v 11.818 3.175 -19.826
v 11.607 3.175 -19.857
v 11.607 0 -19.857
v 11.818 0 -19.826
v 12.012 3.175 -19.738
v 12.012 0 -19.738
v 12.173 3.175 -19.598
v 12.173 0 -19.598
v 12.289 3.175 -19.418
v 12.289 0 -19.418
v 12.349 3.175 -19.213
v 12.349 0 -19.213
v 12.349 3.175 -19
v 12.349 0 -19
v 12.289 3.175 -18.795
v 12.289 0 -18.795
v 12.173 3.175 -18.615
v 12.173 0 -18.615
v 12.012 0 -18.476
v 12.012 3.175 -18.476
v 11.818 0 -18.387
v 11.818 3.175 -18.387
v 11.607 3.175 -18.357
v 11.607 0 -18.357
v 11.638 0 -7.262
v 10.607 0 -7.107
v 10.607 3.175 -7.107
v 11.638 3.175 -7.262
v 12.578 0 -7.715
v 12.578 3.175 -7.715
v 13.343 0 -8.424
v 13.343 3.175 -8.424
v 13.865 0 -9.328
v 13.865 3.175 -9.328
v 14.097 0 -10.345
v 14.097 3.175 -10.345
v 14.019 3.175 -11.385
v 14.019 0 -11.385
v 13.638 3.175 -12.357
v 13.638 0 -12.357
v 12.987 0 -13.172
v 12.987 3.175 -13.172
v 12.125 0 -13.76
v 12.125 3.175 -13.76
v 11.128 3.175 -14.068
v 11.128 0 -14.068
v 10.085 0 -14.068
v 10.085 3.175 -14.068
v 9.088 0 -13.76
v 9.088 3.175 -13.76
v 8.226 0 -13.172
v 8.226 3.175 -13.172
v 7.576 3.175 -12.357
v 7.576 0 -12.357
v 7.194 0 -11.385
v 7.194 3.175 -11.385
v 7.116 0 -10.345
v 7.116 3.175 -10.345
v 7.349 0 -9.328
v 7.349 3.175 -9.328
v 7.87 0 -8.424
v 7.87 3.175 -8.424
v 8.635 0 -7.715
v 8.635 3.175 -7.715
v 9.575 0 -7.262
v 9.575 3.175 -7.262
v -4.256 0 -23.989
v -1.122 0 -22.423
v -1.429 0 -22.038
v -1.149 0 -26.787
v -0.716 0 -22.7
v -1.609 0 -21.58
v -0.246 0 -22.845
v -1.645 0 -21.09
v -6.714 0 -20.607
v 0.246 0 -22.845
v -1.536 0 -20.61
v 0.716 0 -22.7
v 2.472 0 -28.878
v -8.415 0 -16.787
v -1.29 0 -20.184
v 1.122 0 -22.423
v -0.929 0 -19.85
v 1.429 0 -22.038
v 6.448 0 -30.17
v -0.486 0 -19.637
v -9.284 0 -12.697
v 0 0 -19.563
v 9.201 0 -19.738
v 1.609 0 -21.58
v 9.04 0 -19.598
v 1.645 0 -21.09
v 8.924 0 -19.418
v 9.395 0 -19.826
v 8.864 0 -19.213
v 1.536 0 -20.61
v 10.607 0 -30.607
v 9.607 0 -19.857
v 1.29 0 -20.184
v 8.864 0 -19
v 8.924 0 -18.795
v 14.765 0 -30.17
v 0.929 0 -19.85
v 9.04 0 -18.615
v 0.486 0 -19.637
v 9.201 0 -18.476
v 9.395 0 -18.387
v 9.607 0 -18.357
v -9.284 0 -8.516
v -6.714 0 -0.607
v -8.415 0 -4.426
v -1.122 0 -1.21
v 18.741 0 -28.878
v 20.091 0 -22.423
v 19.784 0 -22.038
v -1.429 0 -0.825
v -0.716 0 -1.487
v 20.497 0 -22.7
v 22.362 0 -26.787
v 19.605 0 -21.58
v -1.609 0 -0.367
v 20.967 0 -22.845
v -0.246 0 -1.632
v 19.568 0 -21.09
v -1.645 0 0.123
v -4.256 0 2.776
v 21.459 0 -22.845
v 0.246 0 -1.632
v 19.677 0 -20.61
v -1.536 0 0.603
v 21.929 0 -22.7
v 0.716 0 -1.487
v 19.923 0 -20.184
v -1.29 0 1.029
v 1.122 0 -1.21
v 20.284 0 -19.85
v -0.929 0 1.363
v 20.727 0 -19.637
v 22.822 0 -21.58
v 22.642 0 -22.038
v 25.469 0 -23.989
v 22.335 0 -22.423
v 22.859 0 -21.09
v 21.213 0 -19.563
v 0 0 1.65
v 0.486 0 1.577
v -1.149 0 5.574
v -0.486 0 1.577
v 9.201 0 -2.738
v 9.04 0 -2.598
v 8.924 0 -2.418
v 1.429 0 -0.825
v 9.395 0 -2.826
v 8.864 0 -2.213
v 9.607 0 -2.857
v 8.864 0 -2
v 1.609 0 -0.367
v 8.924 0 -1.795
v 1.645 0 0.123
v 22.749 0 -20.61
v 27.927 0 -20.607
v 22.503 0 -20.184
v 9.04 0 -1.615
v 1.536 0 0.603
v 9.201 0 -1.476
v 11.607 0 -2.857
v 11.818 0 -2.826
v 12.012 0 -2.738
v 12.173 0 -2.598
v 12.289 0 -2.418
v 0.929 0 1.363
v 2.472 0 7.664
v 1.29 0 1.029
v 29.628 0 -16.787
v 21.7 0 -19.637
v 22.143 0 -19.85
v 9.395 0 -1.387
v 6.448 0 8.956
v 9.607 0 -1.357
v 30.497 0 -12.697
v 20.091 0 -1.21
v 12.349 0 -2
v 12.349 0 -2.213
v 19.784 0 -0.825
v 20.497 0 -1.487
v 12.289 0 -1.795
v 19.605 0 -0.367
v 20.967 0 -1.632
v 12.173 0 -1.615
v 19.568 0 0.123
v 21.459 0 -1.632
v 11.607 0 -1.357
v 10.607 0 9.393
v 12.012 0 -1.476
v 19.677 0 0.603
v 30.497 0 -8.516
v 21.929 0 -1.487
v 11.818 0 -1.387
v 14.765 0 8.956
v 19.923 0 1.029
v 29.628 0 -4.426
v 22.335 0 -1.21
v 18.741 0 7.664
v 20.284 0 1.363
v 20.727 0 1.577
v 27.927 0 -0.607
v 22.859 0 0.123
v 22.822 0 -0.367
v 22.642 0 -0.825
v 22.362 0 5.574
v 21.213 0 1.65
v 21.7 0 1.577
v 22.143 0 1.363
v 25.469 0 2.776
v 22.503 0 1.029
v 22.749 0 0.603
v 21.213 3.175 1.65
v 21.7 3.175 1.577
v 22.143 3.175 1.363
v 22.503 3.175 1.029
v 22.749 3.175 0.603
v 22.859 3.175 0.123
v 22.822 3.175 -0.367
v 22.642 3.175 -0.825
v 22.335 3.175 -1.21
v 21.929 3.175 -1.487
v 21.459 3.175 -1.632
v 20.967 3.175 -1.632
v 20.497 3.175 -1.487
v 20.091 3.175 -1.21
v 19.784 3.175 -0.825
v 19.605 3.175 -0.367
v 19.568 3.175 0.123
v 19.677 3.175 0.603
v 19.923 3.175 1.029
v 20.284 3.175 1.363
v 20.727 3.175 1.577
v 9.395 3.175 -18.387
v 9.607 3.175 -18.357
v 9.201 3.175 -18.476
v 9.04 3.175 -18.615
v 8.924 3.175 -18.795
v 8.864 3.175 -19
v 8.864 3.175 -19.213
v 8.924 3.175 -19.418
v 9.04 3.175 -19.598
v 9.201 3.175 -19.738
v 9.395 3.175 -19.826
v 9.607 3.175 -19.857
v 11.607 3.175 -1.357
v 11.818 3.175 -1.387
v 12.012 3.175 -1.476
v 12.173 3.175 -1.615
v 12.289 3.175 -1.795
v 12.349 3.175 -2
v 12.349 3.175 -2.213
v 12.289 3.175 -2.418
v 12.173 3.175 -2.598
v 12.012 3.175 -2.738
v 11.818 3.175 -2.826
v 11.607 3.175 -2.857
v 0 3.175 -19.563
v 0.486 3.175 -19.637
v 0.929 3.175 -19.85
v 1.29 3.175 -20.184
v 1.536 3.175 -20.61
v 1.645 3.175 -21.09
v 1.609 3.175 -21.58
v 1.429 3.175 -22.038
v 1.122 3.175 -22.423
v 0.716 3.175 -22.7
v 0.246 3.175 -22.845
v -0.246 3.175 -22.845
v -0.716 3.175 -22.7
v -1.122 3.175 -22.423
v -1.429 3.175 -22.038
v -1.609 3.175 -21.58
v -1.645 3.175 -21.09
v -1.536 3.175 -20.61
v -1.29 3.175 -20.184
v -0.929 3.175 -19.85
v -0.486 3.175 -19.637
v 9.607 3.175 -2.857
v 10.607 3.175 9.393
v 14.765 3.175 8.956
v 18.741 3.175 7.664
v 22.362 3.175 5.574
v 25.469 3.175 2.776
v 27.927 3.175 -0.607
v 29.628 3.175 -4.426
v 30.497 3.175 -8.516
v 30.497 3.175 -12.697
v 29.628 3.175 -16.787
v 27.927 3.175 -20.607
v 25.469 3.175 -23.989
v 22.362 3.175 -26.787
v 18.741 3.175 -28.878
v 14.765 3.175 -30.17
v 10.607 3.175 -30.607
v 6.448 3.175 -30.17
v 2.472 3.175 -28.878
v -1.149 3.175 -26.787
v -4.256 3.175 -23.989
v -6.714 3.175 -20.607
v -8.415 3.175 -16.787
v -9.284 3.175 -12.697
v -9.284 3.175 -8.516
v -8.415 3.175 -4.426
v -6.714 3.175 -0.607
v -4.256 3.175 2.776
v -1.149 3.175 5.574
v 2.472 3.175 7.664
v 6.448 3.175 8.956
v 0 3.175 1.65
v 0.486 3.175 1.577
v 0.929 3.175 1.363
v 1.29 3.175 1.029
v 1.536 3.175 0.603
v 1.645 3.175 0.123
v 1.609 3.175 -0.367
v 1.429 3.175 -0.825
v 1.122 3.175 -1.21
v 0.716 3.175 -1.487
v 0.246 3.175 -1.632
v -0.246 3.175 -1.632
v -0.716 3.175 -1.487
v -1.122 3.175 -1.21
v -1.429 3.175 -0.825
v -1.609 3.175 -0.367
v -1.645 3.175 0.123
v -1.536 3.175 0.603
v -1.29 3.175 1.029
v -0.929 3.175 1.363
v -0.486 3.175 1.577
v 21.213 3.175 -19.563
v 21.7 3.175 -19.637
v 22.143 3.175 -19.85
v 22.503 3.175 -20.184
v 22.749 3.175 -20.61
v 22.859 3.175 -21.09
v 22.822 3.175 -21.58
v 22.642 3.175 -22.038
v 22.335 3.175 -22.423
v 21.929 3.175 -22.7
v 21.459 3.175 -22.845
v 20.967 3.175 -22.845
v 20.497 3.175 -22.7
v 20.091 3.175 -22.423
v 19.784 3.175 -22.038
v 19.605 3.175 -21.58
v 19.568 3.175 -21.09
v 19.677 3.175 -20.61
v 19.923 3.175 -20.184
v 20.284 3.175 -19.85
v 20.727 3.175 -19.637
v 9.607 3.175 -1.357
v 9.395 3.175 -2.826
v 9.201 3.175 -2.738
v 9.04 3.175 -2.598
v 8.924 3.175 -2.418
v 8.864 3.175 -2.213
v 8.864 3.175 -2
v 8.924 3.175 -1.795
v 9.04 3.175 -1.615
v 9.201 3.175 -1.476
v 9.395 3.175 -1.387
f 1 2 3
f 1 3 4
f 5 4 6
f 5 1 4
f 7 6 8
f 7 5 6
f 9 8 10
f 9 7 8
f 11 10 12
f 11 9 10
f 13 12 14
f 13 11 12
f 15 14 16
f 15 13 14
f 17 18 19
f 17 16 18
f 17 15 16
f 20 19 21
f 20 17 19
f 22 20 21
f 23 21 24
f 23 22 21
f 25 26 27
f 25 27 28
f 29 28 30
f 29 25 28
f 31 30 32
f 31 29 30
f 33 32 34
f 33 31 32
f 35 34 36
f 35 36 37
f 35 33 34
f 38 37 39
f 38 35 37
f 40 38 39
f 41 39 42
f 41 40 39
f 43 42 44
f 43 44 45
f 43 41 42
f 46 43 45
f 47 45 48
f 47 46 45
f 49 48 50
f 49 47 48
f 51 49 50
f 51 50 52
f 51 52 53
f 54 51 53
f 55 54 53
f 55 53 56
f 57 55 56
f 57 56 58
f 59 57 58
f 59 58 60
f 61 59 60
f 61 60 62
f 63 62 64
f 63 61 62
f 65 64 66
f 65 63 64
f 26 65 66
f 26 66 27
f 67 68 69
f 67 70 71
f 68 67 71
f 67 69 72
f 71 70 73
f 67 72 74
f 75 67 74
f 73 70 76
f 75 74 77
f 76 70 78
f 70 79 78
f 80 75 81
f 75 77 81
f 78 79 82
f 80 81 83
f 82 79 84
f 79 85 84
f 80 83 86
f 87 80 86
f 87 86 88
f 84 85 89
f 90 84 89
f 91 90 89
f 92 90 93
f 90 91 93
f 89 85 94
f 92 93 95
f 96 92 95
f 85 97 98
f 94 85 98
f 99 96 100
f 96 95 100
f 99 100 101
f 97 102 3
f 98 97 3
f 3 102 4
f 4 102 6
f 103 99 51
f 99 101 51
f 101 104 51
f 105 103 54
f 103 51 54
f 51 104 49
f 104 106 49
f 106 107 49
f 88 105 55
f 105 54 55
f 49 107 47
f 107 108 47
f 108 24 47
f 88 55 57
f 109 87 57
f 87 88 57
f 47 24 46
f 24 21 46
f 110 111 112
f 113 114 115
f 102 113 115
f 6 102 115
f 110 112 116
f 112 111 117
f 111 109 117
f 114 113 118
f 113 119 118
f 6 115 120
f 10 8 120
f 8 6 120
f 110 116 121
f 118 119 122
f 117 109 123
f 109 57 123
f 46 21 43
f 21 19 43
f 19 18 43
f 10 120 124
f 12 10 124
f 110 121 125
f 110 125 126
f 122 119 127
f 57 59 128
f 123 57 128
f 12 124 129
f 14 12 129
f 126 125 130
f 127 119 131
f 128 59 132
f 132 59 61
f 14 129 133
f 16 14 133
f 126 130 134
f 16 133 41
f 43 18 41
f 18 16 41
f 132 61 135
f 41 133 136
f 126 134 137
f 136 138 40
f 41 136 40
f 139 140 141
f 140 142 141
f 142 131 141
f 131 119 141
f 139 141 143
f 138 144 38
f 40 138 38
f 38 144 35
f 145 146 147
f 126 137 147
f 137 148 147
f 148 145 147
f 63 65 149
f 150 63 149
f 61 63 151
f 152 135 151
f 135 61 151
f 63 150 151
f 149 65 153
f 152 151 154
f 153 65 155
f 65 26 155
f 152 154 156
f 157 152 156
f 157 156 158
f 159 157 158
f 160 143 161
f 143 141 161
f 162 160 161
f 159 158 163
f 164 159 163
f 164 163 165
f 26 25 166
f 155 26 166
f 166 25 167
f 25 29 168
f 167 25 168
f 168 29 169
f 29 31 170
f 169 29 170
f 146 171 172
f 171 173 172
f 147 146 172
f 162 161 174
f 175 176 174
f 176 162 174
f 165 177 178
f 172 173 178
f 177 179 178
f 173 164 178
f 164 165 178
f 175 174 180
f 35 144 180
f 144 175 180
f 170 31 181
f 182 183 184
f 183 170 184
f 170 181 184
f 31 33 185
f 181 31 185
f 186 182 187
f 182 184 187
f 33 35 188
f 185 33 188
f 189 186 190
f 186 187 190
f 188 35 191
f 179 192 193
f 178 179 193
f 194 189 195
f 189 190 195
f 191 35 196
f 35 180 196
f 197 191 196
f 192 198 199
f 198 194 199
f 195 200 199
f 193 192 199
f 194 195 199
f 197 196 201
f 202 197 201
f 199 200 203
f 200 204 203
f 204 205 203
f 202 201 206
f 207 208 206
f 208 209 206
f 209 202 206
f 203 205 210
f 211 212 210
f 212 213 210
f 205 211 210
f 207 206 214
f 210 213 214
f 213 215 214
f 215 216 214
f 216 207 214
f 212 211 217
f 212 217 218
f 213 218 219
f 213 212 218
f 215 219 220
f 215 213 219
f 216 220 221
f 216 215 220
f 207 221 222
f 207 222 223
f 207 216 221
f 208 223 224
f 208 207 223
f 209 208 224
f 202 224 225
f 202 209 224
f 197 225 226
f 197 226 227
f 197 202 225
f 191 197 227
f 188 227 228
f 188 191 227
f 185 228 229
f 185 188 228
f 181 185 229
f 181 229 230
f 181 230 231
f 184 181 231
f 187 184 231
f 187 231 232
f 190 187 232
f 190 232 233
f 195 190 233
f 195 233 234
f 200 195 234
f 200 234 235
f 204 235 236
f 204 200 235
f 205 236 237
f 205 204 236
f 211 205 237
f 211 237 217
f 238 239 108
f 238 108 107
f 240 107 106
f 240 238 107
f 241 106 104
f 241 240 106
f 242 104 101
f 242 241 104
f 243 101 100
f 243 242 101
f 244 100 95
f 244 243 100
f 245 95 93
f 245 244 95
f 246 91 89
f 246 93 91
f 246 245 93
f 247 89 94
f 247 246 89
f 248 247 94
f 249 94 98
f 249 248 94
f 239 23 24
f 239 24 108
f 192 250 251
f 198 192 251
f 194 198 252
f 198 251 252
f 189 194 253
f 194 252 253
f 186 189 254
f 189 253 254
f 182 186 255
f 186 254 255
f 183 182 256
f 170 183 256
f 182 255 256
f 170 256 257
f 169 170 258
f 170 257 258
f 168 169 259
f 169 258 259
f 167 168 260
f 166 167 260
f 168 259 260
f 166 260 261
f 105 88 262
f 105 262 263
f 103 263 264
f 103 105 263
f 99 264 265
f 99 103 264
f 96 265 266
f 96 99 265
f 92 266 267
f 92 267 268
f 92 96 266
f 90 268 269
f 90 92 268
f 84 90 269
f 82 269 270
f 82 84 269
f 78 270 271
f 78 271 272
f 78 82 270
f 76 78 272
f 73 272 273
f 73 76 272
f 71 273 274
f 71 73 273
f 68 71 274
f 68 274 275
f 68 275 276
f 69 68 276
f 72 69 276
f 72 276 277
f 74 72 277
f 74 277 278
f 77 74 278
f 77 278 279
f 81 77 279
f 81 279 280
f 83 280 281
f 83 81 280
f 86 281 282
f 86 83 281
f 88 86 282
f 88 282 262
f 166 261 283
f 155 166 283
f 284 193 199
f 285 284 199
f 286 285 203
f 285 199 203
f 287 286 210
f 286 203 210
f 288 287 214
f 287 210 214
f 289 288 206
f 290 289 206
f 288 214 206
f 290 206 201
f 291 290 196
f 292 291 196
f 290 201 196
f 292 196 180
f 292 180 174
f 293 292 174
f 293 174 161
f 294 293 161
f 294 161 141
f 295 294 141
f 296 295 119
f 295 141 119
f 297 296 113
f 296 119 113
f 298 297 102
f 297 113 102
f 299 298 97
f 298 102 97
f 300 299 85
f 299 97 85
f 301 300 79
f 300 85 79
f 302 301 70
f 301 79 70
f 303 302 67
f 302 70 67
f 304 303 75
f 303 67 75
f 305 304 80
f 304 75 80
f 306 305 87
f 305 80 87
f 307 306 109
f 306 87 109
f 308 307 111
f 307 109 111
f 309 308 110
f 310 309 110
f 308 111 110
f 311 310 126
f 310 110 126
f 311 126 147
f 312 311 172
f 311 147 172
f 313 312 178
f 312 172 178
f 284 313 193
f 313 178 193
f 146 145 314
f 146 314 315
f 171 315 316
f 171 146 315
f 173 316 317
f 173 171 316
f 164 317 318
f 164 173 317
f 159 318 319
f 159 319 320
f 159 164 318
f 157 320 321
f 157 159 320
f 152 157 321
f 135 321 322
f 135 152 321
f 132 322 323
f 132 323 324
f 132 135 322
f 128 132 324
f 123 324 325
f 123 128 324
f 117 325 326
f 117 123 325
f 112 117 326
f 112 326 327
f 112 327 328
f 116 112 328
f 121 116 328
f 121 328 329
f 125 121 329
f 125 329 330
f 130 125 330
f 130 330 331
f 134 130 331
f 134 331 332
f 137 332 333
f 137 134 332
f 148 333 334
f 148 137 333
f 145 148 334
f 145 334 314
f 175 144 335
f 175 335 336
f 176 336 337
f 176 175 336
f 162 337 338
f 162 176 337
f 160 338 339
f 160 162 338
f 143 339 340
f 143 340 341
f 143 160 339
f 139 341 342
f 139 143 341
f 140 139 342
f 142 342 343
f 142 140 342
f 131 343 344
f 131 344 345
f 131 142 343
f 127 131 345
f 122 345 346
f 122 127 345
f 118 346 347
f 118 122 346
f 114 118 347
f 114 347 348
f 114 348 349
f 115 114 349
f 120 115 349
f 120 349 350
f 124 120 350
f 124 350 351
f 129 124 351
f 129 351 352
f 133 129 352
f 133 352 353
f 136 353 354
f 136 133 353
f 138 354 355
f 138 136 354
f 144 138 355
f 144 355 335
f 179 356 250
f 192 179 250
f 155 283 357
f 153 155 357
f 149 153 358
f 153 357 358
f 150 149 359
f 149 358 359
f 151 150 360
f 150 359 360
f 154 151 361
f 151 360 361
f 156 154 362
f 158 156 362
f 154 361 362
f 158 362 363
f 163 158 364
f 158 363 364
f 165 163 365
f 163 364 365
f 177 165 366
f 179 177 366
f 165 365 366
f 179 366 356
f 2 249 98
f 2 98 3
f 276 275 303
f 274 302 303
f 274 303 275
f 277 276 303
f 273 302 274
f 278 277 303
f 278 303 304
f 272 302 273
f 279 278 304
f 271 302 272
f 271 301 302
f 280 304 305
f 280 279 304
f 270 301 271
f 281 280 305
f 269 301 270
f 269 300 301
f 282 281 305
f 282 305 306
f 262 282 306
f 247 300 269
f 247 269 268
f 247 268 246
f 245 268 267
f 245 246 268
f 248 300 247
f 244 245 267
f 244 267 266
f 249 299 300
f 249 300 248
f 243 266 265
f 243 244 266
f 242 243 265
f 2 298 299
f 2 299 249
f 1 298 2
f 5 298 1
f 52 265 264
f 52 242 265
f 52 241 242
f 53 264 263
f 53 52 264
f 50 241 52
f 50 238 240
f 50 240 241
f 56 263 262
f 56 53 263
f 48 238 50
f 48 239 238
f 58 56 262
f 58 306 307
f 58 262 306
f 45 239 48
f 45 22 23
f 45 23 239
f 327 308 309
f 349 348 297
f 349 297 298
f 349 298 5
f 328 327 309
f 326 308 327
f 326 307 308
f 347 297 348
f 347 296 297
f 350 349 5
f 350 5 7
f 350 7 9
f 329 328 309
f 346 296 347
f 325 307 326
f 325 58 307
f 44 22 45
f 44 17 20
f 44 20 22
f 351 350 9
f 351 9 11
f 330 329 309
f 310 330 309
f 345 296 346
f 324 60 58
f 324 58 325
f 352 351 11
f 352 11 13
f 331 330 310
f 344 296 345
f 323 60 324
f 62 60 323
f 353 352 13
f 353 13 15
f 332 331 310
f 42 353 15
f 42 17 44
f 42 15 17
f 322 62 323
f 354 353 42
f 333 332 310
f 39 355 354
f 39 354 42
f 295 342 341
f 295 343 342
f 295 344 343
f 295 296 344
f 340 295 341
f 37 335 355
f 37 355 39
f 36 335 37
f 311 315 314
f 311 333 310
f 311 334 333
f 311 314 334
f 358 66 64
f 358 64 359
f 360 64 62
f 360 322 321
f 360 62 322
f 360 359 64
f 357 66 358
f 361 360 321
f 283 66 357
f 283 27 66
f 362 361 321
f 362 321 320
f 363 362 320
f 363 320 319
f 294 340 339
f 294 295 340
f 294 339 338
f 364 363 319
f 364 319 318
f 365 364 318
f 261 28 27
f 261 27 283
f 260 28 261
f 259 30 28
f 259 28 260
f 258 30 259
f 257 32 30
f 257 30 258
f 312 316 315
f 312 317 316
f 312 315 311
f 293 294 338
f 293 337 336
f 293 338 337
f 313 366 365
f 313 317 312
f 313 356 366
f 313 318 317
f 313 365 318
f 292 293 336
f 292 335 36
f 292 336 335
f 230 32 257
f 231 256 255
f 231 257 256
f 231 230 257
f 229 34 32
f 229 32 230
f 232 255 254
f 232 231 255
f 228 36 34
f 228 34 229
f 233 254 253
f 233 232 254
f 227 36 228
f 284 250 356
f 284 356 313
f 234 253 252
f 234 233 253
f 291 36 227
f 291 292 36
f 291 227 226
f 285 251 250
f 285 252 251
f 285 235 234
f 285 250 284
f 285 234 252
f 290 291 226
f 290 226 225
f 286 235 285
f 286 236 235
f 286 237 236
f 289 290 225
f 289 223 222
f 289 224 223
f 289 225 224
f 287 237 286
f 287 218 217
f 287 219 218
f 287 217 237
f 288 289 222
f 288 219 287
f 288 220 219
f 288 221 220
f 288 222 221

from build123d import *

# Parameters (mm, degrees)
SKETCH1_R           = 20
SKETCH1_R_2         = 3.5
SKETCH1_R_3         = 1.65
BOSS_EXTRUDE1_DEPTH = 3.175
CUT_EXTRUDE1_DEPTH  = 44.400561775


with BuildPart() as part:
    # Sketch1 → Boss-Extrude1 (new body)
    with BuildSketch(Plane(origin=(0, 0, 0), x_dir=(1, 0, 0), z_dir=(0, 1, 0))):
        with Locations(Location((10.606601718, 10.606601718, 0), (0, 0, 270))):
            Circle(SKETCH1_R)
        with Locations(Location((10.606601718, 10.606601718, 0), (0, 0, 270))):
            Circle(SKETCH1_R_2, mode=Mode.SUBTRACT)
        with Locations(Location((0, 21.213203436, 0), (0, 0, 270))):
            Circle(SKETCH1_R_3, mode=Mode.SUBTRACT)
        with Locations(Location((21.213203436, 21.213203436, 0), (0, 0, 270))):
            Circle(SKETCH1_R_3, mode=Mode.SUBTRACT)
        with Locations(Location((21.213203436, 0, 0), (0, 0, 270))):
            Circle(SKETCH1_R_3, mode=Mode.SUBTRACT)
        with Locations(Location((0, 0, 0), (0, 0, 270))):
            Circle(SKETCH1_R_3, mode=Mode.SUBTRACT)
    extrude(amount=BOSS_EXTRUDE1_DEPTH)

    # Sketch2 → Cut-Extrude1 (cut, through all)
    with BuildSketch(Plane(origin=(0, 3.175, 0), x_dir=(1, 0, 0), z_dir=(0, 1, 0))):
        with BuildLine():
            Line((9.606601718, 19.856601736), (11.606601718, 19.856601736))
            ThreePointArc((11.606601718, 19.856601736), (12.356601718, 19.106601736), (11.606601718, 18.356601736))
            Line((11.606601718, 18.356601736), (9.606601718, 18.356601736))
            ThreePointArc((9.606601718, 18.356601736), (8.856601718, 19.106601736), (9.606601718, 19.856601736))
        make_face()
        with BuildLine():
            Line((9.606601718, 1.3566017), (11.606601718, 1.3566017))
            ThreePointArc((11.606601718, 1.3566017), (12.356601718, 2.1066017), (11.606601718, 2.8566017))
            Line((11.606601718, 2.8566017), (9.606601718, 2.8566017))
            ThreePointArc((9.606601718, 2.8566017), (8.856601718, 2.1066017), (9.606601718, 1.3566017))
        make_face()
    extrude(amount=-CUT_EXTRUDE1_DEPTH, mode=Mode.SUBTRACT)


solid = part.part
